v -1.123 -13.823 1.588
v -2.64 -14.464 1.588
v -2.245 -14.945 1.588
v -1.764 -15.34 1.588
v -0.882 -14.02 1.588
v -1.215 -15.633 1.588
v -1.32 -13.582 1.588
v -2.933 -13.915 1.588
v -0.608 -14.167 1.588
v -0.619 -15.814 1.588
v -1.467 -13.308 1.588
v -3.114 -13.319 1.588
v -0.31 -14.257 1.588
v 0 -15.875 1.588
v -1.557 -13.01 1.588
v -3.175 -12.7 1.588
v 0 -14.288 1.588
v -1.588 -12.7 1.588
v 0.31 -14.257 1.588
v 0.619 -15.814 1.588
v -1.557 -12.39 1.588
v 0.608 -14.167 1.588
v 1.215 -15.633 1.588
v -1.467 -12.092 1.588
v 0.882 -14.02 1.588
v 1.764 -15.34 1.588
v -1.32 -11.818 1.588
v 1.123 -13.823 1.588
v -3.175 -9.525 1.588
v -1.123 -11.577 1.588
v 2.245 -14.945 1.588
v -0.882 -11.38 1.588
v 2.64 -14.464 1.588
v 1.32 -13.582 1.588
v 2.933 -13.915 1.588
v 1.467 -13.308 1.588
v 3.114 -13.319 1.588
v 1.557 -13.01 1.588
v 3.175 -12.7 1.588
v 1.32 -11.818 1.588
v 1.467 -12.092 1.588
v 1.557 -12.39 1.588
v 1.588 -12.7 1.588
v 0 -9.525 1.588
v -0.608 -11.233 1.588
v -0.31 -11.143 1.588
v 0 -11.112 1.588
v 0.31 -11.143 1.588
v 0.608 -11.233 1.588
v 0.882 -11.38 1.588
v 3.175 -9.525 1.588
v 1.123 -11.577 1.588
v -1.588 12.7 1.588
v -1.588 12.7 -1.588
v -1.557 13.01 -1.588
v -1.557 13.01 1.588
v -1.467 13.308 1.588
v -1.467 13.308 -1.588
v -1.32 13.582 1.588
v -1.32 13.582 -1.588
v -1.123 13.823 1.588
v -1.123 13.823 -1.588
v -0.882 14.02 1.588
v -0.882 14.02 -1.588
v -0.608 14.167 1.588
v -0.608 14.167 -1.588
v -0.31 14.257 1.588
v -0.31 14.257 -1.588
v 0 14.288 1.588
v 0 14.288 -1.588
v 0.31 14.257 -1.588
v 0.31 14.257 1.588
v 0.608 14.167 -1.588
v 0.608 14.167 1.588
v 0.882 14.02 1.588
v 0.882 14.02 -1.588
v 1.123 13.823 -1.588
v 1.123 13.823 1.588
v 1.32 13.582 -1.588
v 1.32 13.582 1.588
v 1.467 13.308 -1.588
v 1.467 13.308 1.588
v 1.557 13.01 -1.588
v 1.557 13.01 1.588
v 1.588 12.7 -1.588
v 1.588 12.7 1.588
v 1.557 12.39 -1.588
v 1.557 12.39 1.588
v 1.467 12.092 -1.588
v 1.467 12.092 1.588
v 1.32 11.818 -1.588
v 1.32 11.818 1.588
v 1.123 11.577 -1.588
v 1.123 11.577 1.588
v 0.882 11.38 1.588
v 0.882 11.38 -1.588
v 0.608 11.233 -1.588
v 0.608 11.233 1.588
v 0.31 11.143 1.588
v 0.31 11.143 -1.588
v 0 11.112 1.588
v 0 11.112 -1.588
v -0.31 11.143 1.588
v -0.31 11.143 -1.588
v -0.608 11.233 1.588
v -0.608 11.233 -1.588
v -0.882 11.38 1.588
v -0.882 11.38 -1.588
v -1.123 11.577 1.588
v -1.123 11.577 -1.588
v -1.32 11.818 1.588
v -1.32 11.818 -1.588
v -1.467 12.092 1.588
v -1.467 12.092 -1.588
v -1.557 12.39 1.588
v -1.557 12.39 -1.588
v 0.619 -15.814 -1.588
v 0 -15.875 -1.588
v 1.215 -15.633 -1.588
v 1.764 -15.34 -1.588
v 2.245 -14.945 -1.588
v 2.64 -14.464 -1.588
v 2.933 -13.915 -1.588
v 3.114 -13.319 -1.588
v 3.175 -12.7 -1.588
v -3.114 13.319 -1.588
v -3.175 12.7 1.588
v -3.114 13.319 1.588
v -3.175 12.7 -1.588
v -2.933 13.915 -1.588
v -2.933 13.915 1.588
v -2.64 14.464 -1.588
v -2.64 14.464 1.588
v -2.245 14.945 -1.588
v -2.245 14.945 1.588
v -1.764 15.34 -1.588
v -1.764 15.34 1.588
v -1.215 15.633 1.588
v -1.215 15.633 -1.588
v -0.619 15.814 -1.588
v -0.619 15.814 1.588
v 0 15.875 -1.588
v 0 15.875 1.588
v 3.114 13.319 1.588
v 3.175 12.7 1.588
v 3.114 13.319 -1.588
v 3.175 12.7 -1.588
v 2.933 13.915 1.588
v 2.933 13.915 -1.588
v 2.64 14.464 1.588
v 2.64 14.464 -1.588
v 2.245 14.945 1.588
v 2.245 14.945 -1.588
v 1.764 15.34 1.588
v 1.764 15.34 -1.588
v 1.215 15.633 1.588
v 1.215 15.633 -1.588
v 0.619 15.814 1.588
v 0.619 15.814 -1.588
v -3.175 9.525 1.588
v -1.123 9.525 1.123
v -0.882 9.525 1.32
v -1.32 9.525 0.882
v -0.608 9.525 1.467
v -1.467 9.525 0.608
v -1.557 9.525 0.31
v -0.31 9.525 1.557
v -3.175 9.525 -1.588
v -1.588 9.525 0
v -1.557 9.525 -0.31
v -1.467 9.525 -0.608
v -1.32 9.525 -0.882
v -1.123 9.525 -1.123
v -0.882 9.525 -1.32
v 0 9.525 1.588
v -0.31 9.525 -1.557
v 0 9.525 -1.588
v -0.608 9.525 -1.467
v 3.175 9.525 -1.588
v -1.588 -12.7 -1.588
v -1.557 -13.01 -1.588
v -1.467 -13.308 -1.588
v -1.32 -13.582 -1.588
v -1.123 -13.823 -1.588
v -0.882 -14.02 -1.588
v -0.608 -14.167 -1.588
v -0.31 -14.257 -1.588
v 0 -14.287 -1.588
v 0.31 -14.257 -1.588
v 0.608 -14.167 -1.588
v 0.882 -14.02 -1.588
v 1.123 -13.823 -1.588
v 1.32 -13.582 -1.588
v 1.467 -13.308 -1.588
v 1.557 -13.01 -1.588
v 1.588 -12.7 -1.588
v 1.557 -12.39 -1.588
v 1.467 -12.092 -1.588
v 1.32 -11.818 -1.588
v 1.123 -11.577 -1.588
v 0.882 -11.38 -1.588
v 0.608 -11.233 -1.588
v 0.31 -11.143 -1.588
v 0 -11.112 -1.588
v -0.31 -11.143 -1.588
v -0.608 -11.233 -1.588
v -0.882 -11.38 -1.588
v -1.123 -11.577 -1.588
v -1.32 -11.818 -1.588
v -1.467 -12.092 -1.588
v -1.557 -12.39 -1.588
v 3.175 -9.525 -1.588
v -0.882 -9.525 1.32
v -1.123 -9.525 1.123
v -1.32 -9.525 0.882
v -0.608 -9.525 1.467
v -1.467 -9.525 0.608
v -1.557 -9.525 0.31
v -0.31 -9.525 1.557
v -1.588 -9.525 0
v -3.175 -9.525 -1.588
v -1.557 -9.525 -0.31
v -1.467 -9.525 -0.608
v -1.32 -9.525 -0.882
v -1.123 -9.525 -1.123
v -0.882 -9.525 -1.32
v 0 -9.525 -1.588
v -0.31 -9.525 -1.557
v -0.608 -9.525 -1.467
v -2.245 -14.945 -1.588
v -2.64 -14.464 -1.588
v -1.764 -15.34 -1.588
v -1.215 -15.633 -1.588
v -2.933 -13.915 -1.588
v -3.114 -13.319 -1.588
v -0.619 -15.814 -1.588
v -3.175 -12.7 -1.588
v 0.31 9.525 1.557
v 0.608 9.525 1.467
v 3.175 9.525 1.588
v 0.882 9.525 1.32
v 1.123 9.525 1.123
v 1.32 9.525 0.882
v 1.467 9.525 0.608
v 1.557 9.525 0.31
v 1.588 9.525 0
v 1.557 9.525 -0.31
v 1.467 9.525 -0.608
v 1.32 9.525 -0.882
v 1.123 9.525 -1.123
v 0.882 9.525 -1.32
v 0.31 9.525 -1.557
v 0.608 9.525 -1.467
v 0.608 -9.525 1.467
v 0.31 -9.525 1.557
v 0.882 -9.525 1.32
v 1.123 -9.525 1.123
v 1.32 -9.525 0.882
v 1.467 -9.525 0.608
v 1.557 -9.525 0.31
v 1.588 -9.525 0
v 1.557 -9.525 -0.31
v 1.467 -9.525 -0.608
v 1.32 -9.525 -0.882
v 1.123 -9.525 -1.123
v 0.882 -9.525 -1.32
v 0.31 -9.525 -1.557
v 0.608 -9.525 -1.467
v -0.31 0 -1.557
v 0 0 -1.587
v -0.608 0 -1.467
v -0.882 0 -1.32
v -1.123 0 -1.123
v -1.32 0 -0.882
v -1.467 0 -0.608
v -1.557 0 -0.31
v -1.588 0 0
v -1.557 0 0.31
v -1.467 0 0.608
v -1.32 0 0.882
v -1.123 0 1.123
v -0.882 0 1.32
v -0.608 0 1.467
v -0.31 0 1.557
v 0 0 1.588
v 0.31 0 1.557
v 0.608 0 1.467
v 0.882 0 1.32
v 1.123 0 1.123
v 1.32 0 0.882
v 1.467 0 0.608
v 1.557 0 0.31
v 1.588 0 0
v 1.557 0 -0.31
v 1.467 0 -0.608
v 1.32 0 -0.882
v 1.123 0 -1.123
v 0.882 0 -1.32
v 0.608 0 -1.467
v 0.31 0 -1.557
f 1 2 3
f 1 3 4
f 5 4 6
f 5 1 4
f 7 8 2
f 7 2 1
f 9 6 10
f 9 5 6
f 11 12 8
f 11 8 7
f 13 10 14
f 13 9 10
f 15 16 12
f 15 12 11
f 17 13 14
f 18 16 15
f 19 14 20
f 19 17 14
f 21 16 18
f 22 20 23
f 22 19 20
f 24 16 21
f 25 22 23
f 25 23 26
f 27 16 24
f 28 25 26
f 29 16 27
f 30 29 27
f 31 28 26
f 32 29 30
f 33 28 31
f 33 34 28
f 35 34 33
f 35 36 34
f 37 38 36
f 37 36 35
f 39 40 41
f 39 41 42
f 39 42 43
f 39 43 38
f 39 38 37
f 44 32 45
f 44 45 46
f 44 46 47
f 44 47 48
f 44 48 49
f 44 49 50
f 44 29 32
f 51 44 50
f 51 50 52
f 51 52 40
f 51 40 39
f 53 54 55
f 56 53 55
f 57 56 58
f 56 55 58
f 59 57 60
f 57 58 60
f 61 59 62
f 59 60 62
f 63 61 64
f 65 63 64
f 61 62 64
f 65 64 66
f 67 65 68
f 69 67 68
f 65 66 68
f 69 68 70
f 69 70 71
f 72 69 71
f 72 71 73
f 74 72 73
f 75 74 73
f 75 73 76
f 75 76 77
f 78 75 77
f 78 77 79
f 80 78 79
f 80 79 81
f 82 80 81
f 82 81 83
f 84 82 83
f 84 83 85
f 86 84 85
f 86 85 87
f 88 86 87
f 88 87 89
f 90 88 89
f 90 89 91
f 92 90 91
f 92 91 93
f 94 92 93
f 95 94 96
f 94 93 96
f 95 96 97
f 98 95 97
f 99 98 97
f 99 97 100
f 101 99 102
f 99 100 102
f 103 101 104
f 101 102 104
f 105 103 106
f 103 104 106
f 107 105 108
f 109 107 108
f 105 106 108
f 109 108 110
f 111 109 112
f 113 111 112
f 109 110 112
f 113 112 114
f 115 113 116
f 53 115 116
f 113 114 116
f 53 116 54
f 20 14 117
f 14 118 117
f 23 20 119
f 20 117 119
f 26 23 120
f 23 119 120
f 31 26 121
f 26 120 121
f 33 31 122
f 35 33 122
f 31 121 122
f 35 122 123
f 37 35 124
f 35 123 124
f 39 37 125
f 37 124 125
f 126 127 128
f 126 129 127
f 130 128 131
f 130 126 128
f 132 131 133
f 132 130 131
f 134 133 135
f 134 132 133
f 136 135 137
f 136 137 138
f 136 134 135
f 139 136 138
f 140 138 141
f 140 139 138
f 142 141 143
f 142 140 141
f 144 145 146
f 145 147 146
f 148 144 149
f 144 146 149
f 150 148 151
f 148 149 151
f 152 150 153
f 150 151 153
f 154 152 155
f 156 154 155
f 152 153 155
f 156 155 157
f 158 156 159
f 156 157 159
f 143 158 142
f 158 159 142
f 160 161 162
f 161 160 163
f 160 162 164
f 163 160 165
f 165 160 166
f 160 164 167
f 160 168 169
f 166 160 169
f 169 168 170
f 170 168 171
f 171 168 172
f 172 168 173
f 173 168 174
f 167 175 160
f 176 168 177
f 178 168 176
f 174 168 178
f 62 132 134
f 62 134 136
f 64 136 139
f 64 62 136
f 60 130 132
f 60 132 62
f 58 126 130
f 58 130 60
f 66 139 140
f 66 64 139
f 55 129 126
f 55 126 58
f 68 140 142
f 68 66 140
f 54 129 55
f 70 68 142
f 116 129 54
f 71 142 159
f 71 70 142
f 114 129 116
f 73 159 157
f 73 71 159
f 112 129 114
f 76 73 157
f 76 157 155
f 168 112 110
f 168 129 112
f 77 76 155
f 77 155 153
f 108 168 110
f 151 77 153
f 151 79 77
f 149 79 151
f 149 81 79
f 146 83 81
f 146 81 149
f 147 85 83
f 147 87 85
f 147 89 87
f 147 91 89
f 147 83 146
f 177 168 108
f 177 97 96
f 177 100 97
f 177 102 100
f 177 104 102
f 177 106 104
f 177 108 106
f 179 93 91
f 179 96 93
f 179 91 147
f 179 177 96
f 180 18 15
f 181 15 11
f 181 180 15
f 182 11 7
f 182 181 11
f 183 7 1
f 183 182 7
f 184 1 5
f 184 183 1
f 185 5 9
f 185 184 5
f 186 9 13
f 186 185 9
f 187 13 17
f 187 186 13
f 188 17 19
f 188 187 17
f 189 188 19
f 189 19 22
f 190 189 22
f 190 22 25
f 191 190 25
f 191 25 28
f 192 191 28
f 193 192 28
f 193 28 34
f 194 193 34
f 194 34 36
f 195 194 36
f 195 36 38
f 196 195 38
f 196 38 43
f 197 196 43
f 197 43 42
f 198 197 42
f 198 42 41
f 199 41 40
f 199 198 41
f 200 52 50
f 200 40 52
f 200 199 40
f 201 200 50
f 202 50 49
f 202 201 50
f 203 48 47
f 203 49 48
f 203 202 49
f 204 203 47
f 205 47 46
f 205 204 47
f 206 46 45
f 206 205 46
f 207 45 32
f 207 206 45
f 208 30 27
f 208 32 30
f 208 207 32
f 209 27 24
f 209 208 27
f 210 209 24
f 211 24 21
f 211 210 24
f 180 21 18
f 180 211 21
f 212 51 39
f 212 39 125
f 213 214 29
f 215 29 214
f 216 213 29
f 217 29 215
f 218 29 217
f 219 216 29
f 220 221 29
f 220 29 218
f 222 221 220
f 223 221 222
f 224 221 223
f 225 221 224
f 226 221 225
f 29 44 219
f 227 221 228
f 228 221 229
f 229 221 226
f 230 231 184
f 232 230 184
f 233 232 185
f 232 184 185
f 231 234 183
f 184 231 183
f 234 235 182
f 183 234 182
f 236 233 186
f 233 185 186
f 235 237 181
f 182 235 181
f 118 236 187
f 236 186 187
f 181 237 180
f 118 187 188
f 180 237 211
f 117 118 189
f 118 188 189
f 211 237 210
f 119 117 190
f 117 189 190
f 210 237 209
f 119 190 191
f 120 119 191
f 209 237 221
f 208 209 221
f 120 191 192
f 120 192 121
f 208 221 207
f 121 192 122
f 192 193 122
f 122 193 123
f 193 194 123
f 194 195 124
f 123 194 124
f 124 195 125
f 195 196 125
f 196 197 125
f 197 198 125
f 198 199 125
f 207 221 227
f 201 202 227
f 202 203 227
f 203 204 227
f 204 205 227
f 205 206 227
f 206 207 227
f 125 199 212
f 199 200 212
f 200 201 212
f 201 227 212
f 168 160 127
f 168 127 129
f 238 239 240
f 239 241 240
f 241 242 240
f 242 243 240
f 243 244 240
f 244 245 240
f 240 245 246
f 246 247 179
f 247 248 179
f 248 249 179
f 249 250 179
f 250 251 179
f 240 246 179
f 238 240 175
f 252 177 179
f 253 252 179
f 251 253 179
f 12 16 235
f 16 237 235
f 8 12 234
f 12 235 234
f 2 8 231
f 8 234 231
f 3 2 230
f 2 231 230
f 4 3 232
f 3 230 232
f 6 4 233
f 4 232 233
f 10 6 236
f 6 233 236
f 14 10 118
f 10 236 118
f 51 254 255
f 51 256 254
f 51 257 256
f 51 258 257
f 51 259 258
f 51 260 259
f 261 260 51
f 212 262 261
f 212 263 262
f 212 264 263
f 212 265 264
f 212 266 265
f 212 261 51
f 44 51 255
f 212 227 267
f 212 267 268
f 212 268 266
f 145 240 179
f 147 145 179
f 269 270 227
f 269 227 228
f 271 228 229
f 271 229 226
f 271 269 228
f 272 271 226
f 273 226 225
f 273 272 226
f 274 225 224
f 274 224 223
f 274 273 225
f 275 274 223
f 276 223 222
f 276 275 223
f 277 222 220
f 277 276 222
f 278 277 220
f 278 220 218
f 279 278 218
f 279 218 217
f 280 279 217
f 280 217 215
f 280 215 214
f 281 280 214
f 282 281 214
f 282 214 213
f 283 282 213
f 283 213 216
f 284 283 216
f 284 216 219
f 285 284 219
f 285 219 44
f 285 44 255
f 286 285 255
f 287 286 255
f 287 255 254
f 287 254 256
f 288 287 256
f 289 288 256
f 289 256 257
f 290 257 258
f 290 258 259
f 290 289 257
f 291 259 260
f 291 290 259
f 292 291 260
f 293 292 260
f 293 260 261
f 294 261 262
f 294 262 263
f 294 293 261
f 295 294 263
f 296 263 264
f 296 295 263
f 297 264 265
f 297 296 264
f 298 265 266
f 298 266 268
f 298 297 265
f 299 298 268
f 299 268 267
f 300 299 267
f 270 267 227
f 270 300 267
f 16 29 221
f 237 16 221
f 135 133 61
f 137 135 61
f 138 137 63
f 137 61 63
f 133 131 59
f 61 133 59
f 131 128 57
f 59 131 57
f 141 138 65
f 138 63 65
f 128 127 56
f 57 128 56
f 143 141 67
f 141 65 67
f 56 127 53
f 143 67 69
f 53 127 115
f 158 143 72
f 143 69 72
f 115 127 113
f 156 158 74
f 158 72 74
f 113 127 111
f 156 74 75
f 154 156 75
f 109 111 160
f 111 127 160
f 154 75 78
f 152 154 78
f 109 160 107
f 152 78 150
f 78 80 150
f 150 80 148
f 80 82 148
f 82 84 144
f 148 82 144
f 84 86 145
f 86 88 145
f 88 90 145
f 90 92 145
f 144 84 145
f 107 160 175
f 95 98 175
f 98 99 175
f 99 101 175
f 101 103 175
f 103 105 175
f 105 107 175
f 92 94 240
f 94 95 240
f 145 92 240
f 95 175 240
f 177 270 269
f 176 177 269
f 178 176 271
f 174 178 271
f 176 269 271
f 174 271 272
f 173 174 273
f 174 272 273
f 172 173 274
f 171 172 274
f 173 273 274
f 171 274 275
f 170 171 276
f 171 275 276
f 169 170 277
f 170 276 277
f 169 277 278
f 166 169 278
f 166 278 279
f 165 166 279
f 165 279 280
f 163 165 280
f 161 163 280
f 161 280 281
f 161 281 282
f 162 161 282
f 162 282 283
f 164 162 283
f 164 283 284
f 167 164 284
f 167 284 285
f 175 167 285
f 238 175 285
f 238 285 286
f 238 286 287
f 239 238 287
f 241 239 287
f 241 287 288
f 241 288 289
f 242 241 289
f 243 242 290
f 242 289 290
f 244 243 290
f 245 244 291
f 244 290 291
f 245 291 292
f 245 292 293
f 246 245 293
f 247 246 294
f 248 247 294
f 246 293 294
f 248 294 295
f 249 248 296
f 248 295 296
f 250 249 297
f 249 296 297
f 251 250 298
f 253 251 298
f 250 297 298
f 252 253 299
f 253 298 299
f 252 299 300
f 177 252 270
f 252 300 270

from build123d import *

# Parameters (mm, degrees)
SKETCH1_R           = 1.5875
BOSS_EXTRUDE1_DEPTH = 9.525
SKETCH2_W           = 6.35
SKETCH2_H           = 3.175
BOSS_EXTRUDE2_DEPTH = 6.35
SKETCH3_R           = 1.5875
CUT_EXTRUDE1_DEPTH  = 17.497783942
FILLET1_R           = 3.175


with BuildPart() as part:
    # Sketch1 → Boss-Extrude1 (new body)
    with BuildSketch(Plane(origin=(0, 0, 0), x_dir=(1, 0, 0), z_dir=(0, 1, 0))):
        with Locations(Location((0, 0, 0), (0, 0, 90))):
            Circle(SKETCH1_R)
    boss_extrude1 = extrude(amount=BOSS_EXTRUDE1_DEPTH)

    # Sketch2 → Boss-Extrude2 (add)
    with BuildSketch(Plane(origin=(0, 9.525, 0), x_dir=(1, 0, 0), z_dir=(0, 1, 0))):
        Rectangle(SKETCH2_W, SKETCH2_H)
    boss_extrude2 = extrude(amount=BOSS_EXTRUDE2_DEPTH)

    # Sketch3 → Cut-Extrude1 (cut, through all)
    with BuildSketch(Plane(origin=(0, 0, -1.5875), x_dir=(-1, 0, 0), z_dir=(0, 0, -1))):
        with Locations((0, 12.7)):
            Circle(SKETCH3_R)
    cut_extrude1 = extrude(amount=-CUT_EXTRUDE1_DEPTH, mode=Mode.SUBTRACT)

    # Mirror1: Boss-Extrude1, Boss-Extrude2, Cut-Extrude1 across plane
    add(boss_extrude1.mirror(Plane.ZX))
    add(boss_extrude2.mirror(Plane.ZX))
    add(cut_extrude1.mirror(Plane.ZX), mode=Mode.SUBTRACT)

    # Fillet1
    fillet1_edges = [part.edges().sort_by_distance(p)[0] for p in [
        (-3.175, -15.875, 0),
        (3.175, -15.875, 0),
        (-3.175, 15.875, 0),
        (3.175, 15.875, 0),
    ]]
    fillet(fillet1_edges, radius=FILLET1_R - 0.0001)  # a hair under: the kernel refuses the full size


solid = part.part
